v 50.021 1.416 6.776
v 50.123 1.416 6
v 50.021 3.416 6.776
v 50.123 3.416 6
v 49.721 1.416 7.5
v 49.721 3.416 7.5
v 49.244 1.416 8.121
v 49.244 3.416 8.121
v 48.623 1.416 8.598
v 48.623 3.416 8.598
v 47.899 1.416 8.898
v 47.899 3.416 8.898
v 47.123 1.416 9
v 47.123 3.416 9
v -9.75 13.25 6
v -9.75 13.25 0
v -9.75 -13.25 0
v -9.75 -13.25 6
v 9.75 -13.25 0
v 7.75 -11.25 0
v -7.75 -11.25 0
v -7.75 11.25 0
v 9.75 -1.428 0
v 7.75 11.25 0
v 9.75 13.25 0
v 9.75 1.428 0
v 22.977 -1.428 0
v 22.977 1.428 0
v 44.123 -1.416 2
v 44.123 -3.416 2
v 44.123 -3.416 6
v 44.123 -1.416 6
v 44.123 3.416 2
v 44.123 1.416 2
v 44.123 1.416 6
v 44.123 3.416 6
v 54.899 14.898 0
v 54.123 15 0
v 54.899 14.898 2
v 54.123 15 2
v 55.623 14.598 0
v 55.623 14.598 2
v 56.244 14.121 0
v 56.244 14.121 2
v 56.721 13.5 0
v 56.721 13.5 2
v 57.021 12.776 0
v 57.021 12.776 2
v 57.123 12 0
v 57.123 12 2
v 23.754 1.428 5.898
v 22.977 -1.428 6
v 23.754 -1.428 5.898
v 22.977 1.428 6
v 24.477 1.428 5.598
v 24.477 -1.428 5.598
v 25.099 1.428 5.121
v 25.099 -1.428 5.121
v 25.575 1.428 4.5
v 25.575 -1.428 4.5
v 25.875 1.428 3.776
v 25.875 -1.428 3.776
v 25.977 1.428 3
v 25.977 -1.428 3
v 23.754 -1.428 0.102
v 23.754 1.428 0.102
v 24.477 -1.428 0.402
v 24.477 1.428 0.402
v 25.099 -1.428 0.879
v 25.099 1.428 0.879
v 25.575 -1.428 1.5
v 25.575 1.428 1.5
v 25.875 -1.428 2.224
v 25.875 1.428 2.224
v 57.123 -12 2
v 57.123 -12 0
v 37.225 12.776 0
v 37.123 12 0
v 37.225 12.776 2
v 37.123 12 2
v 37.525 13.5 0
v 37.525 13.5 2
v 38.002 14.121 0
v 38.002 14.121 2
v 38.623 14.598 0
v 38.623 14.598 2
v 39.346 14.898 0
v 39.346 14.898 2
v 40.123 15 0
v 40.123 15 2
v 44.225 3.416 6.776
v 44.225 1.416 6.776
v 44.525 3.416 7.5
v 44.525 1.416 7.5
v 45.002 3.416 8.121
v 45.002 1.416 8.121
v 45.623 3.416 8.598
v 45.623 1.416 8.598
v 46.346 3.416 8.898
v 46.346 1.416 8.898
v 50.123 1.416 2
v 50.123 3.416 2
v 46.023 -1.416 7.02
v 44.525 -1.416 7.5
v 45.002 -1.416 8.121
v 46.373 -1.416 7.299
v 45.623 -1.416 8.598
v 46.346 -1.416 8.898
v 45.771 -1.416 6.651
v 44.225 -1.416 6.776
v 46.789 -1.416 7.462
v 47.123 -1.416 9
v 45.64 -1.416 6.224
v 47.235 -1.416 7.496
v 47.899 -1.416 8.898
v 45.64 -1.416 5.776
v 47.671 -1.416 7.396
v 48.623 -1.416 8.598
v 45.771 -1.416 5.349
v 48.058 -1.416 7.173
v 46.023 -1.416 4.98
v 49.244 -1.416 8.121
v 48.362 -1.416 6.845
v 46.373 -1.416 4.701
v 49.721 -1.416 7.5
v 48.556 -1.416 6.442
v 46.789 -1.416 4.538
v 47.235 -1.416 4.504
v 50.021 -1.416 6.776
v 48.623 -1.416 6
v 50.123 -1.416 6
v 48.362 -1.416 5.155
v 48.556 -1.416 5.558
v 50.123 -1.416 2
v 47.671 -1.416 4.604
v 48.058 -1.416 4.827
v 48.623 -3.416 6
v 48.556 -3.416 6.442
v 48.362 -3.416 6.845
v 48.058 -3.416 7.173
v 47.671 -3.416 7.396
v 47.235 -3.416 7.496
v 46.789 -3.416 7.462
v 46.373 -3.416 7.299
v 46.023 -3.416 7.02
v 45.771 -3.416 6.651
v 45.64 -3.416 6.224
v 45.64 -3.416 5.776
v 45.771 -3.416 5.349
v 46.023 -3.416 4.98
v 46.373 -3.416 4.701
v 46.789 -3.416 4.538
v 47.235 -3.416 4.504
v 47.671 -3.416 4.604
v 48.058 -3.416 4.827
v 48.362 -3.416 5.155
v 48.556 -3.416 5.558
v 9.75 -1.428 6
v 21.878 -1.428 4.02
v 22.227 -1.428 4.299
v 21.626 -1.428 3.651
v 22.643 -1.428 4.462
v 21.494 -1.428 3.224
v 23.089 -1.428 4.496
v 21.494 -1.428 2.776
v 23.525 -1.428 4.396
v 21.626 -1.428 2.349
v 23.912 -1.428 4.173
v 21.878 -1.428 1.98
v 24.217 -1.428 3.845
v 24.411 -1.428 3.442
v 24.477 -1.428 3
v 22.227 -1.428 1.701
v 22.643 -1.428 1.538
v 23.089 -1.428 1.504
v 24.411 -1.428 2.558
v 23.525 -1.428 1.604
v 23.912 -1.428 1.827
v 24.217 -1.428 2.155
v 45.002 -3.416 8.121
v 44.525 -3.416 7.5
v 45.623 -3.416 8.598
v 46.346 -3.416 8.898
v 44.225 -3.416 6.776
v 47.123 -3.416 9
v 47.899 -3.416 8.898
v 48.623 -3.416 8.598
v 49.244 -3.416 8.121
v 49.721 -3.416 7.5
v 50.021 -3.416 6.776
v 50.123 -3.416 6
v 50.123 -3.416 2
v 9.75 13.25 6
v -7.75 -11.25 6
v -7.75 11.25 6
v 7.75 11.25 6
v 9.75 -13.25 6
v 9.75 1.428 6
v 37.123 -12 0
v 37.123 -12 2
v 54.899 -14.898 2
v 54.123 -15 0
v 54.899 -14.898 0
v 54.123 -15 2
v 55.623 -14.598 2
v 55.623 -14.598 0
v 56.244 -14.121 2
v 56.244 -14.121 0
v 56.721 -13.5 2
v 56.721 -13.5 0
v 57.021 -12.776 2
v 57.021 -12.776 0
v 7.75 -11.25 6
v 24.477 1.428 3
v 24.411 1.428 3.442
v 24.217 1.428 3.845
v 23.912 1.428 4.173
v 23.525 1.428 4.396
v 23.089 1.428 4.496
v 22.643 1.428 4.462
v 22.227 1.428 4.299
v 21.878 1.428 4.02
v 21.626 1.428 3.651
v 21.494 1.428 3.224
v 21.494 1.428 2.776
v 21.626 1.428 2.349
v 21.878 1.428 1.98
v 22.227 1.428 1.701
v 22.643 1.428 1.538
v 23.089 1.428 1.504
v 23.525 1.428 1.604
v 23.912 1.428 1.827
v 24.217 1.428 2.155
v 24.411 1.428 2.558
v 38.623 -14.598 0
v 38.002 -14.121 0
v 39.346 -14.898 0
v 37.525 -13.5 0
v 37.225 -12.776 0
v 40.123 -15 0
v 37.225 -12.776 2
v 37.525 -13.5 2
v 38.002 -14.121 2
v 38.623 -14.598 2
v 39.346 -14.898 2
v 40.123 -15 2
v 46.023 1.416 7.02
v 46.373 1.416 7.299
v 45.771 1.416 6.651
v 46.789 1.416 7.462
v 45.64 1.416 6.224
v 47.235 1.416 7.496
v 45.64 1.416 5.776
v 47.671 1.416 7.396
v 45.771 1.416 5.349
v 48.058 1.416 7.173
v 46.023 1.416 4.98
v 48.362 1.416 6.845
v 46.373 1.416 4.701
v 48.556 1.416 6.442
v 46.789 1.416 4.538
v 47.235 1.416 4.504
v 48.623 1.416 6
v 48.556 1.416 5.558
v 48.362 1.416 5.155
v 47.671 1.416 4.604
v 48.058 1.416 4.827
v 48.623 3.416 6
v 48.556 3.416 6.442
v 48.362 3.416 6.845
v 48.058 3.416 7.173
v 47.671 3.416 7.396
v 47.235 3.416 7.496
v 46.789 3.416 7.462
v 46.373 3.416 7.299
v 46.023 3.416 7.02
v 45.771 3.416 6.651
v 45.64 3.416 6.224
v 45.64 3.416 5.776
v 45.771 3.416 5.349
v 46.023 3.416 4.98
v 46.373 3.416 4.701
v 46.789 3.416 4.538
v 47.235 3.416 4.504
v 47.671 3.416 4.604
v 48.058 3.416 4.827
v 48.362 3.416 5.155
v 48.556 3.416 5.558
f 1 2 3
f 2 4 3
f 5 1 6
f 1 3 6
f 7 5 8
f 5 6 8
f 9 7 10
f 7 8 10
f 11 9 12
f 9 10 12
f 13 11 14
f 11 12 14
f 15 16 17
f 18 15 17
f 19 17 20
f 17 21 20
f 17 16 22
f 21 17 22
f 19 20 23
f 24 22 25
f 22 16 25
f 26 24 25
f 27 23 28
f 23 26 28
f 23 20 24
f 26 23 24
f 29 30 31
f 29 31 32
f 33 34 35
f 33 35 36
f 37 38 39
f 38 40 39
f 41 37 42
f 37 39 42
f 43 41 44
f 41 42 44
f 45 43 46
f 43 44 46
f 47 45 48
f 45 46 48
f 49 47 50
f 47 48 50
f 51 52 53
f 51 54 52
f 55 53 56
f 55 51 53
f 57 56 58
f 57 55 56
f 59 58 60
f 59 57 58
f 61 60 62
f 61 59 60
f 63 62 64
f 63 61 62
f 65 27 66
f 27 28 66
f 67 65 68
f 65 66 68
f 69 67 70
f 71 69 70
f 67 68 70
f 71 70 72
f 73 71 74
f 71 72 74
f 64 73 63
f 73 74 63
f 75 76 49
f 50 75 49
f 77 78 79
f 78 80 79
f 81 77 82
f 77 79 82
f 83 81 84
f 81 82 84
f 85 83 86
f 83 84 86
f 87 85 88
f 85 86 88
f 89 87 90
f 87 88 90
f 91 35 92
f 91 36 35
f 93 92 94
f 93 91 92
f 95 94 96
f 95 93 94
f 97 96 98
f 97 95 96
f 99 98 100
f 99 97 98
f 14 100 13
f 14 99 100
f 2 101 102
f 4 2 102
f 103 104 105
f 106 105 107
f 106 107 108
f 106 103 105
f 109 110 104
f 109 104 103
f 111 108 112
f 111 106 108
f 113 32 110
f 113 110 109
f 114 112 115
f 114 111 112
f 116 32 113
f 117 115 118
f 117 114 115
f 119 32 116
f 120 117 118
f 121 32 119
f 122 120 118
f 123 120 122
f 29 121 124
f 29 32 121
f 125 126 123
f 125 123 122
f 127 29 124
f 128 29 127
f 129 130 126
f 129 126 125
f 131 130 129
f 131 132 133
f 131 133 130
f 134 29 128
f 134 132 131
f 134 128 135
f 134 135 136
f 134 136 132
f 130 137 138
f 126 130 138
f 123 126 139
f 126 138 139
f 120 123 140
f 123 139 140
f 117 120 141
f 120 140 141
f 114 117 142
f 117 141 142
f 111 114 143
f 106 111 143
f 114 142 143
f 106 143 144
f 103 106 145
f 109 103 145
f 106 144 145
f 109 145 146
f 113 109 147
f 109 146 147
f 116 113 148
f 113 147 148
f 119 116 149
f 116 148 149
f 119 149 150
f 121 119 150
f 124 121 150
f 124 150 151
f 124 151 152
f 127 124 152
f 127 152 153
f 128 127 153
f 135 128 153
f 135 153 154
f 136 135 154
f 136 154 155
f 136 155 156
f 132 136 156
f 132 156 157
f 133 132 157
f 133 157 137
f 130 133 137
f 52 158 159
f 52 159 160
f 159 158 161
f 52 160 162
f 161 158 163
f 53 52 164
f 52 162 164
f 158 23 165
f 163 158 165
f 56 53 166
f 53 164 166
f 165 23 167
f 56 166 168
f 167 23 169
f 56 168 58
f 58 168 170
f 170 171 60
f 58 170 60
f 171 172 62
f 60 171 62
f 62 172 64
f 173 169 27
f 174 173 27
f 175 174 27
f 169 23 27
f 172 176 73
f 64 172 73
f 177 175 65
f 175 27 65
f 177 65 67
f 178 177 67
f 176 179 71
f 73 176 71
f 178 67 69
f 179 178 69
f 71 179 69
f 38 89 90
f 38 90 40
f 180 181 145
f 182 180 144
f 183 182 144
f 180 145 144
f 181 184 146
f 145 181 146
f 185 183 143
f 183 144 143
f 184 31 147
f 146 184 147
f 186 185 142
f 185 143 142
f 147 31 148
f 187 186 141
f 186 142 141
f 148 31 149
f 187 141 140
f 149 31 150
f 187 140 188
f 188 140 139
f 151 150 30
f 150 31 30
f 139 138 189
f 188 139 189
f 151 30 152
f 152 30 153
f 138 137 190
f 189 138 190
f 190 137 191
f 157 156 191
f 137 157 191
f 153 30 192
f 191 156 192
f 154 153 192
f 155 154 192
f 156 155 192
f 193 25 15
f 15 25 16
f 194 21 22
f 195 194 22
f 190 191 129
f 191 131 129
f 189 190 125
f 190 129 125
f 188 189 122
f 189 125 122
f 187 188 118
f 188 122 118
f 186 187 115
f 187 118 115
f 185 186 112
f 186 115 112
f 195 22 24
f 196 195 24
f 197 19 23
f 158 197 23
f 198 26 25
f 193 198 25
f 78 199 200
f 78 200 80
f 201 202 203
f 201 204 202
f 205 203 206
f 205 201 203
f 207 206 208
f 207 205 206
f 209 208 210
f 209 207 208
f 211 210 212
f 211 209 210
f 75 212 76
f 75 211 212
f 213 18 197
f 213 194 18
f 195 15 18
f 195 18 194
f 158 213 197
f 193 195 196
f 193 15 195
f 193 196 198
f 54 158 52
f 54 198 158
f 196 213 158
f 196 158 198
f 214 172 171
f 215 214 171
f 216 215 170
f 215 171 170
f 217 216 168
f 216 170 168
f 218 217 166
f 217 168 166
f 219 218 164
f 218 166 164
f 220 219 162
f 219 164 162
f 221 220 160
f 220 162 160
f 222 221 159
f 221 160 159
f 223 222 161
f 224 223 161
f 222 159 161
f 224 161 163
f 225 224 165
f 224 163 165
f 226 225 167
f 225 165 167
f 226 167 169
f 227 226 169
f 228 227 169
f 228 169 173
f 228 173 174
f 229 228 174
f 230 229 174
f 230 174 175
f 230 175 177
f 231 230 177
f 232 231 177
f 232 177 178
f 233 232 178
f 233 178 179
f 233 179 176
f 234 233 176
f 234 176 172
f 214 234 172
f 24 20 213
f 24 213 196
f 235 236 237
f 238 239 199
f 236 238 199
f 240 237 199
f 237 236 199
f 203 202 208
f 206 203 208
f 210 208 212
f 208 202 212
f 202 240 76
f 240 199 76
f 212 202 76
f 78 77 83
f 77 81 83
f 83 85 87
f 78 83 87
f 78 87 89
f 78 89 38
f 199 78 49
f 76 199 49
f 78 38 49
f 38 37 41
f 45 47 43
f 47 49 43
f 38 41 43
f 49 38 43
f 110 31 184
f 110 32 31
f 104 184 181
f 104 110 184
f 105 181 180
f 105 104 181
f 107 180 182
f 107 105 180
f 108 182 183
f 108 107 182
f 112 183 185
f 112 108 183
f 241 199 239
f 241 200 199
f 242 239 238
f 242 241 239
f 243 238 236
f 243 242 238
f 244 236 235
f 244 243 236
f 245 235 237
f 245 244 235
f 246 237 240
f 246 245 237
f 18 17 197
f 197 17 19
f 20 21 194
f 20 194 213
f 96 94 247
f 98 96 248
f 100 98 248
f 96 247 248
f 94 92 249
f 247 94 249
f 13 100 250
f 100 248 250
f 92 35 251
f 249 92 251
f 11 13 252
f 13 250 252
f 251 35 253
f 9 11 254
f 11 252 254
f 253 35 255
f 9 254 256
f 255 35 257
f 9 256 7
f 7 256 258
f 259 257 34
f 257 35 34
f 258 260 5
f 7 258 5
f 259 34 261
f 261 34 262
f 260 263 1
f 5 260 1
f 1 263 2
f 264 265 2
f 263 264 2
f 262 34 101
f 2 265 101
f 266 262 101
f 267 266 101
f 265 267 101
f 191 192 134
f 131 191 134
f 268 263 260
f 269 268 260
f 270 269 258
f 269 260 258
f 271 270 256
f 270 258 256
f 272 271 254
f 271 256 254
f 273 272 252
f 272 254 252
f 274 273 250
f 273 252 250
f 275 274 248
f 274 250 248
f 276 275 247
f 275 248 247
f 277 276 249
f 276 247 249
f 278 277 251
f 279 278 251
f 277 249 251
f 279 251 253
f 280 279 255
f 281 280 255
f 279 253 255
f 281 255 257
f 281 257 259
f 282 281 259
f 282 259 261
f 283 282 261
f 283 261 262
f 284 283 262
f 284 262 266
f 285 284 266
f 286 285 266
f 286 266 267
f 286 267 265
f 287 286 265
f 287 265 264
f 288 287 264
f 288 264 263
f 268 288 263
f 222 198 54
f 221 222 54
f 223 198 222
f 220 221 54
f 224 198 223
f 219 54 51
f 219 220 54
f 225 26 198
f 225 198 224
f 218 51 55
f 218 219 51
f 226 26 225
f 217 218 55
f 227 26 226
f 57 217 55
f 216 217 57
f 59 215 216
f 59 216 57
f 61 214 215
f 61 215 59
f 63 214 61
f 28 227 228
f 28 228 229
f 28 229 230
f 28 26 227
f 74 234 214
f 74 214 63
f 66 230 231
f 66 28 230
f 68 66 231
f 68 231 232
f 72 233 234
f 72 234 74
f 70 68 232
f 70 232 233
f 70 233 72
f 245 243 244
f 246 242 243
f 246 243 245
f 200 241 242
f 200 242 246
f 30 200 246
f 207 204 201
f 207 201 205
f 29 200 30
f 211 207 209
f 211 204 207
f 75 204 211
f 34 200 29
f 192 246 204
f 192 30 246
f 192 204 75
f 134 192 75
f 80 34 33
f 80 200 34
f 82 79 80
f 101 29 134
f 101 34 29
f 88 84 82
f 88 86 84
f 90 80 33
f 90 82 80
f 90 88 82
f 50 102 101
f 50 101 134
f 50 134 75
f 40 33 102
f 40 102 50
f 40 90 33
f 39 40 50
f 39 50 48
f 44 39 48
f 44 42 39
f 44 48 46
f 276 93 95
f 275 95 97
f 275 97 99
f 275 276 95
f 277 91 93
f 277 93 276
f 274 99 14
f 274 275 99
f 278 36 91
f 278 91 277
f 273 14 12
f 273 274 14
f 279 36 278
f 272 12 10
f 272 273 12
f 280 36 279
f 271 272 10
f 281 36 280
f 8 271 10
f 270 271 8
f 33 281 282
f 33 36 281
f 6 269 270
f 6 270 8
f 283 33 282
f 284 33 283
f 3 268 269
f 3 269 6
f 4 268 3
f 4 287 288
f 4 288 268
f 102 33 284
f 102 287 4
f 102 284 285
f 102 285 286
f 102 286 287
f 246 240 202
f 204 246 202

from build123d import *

# Parameters (mm, degrees)
F0_W     = 15.5
F0_H     = 22.5
F0_W_2   = 16.2271768153
F0_H_2   = 2.8558950871
F1_DEPTH = 6
F2_R     = 1.5
F3_DEPTH = 25
F4_W     = 20
F4_H     = 30
F4_W_2   = 6
F4_H_2   = 2
F5_DEPTH = 2
F6_DEPTH = 9
F7_R     = 2.99999
F7_2_R   = 2.99999
F8_R     = 1.5
F9_DEPTH = 25


# Not quite as in the source:
# - a fillet or chamfer is up to 0.001 mm smaller than in the source, because OpenCascade refuses the exact size


with BuildPart() as f1:
    # F0 (on Top) → F1 (new body)
    with BuildSketch(Plane.XY):
        Polygon((-9.75, -13.25), (9.75, -13.25), (9.75, -1.4279475436), (9.75, 1.4279475436), (9.75, 13.25), (-9.75, 13.25), align=None)
        Rectangle(F0_W, F0_H, mode=Mode.SUBTRACT)
        with Locations((17.8635884076, 0)):
            Rectangle(F0_W_2, F0_H_2)
    extrude(amount=F1_DEPTH)

    # F2 (on face) → F3 (cut)
    with BuildSketch(Plane.XZ.offset(1.4279475436)):
        with Locations((22.9771768153, 3)):
            Circle(F2_R)
    extrude(amount=-F3_DEPTH, mode=Mode.SUBTRACT)

    # F7 (radius 3 in the source; OpenCascade refuses exactly that, so slightly less here)
    f7_edges = [f1.edges().sort_by_distance(p)[0] for p in [
        (25.977177, 0, 0),
        (25.977177, 0, 6),
    ]]
    fillet(f7_edges, radius=F7_R)


with BuildPart() as f5:
    # F4 (on Top) → F5 (new body)
    with BuildSketch(Plane.XY):
        with Locations((47.1228286624, 0)):
            Rectangle(F4_W, F4_H)
        with Locations((47.1228286624, -2.4156674554)):
            Rectangle(F4_W_2, F4_H_2, mode=Mode.SUBTRACT)
        with Locations((47.1228286624, 2.4156674554)):
            Rectangle(F4_W_2, F4_H_2, mode=Mode.SUBTRACT)
        with Locations((47.1228286624, 2.4156674554)):
            Rectangle(F4_W_2, F4_H_2)
        with Locations((47.1228286624, -2.4156674554)):
            Rectangle(F4_W_2, F4_H_2)
    extrude(amount=F5_DEPTH)

    # F4 (on Top) → F6 (join)
    with BuildSketch(Plane.XY):
        with Locations((47.1228286624, 2.4156674554)):
            Rectangle(F4_W_2, F4_H_2)
        with Locations((47.1228286624, -2.4156674554)):
            Rectangle(F4_W_2, F4_H_2)
    extrude(amount=F6_DEPTH)

    # F7#2 (radius 3 in the source; OpenCascade refuses exactly that, so slightly less here)
    f7_2_edges = [f5.edges().sort_by_distance(p)[0] for p in [
        (44.122829, 2.415667, 9),
        (44.122829, -2.415667, 9),
        (50.122829, 2.415667, 9),
        (50.122829, -2.415667, 9),
        (37.122829, -15, 1),
        (57.122829, -15, 1),
        (57.122829, 15, 1),
        (37.122829, 15, 1),
    ]]
    fillet(f7_2_edges, radius=F7_2_R)

    # F8 (on face) → F9 (cut)
    with BuildSketch(Plane.XZ.offset(3.4156674554)):
        with Locations((47.1228286624, 6)):
            Circle(F8_R)
    extrude(amount=-F9_DEPTH, mode=Mode.SUBTRACT)


solid = Compound([f1.part, f5.part])
